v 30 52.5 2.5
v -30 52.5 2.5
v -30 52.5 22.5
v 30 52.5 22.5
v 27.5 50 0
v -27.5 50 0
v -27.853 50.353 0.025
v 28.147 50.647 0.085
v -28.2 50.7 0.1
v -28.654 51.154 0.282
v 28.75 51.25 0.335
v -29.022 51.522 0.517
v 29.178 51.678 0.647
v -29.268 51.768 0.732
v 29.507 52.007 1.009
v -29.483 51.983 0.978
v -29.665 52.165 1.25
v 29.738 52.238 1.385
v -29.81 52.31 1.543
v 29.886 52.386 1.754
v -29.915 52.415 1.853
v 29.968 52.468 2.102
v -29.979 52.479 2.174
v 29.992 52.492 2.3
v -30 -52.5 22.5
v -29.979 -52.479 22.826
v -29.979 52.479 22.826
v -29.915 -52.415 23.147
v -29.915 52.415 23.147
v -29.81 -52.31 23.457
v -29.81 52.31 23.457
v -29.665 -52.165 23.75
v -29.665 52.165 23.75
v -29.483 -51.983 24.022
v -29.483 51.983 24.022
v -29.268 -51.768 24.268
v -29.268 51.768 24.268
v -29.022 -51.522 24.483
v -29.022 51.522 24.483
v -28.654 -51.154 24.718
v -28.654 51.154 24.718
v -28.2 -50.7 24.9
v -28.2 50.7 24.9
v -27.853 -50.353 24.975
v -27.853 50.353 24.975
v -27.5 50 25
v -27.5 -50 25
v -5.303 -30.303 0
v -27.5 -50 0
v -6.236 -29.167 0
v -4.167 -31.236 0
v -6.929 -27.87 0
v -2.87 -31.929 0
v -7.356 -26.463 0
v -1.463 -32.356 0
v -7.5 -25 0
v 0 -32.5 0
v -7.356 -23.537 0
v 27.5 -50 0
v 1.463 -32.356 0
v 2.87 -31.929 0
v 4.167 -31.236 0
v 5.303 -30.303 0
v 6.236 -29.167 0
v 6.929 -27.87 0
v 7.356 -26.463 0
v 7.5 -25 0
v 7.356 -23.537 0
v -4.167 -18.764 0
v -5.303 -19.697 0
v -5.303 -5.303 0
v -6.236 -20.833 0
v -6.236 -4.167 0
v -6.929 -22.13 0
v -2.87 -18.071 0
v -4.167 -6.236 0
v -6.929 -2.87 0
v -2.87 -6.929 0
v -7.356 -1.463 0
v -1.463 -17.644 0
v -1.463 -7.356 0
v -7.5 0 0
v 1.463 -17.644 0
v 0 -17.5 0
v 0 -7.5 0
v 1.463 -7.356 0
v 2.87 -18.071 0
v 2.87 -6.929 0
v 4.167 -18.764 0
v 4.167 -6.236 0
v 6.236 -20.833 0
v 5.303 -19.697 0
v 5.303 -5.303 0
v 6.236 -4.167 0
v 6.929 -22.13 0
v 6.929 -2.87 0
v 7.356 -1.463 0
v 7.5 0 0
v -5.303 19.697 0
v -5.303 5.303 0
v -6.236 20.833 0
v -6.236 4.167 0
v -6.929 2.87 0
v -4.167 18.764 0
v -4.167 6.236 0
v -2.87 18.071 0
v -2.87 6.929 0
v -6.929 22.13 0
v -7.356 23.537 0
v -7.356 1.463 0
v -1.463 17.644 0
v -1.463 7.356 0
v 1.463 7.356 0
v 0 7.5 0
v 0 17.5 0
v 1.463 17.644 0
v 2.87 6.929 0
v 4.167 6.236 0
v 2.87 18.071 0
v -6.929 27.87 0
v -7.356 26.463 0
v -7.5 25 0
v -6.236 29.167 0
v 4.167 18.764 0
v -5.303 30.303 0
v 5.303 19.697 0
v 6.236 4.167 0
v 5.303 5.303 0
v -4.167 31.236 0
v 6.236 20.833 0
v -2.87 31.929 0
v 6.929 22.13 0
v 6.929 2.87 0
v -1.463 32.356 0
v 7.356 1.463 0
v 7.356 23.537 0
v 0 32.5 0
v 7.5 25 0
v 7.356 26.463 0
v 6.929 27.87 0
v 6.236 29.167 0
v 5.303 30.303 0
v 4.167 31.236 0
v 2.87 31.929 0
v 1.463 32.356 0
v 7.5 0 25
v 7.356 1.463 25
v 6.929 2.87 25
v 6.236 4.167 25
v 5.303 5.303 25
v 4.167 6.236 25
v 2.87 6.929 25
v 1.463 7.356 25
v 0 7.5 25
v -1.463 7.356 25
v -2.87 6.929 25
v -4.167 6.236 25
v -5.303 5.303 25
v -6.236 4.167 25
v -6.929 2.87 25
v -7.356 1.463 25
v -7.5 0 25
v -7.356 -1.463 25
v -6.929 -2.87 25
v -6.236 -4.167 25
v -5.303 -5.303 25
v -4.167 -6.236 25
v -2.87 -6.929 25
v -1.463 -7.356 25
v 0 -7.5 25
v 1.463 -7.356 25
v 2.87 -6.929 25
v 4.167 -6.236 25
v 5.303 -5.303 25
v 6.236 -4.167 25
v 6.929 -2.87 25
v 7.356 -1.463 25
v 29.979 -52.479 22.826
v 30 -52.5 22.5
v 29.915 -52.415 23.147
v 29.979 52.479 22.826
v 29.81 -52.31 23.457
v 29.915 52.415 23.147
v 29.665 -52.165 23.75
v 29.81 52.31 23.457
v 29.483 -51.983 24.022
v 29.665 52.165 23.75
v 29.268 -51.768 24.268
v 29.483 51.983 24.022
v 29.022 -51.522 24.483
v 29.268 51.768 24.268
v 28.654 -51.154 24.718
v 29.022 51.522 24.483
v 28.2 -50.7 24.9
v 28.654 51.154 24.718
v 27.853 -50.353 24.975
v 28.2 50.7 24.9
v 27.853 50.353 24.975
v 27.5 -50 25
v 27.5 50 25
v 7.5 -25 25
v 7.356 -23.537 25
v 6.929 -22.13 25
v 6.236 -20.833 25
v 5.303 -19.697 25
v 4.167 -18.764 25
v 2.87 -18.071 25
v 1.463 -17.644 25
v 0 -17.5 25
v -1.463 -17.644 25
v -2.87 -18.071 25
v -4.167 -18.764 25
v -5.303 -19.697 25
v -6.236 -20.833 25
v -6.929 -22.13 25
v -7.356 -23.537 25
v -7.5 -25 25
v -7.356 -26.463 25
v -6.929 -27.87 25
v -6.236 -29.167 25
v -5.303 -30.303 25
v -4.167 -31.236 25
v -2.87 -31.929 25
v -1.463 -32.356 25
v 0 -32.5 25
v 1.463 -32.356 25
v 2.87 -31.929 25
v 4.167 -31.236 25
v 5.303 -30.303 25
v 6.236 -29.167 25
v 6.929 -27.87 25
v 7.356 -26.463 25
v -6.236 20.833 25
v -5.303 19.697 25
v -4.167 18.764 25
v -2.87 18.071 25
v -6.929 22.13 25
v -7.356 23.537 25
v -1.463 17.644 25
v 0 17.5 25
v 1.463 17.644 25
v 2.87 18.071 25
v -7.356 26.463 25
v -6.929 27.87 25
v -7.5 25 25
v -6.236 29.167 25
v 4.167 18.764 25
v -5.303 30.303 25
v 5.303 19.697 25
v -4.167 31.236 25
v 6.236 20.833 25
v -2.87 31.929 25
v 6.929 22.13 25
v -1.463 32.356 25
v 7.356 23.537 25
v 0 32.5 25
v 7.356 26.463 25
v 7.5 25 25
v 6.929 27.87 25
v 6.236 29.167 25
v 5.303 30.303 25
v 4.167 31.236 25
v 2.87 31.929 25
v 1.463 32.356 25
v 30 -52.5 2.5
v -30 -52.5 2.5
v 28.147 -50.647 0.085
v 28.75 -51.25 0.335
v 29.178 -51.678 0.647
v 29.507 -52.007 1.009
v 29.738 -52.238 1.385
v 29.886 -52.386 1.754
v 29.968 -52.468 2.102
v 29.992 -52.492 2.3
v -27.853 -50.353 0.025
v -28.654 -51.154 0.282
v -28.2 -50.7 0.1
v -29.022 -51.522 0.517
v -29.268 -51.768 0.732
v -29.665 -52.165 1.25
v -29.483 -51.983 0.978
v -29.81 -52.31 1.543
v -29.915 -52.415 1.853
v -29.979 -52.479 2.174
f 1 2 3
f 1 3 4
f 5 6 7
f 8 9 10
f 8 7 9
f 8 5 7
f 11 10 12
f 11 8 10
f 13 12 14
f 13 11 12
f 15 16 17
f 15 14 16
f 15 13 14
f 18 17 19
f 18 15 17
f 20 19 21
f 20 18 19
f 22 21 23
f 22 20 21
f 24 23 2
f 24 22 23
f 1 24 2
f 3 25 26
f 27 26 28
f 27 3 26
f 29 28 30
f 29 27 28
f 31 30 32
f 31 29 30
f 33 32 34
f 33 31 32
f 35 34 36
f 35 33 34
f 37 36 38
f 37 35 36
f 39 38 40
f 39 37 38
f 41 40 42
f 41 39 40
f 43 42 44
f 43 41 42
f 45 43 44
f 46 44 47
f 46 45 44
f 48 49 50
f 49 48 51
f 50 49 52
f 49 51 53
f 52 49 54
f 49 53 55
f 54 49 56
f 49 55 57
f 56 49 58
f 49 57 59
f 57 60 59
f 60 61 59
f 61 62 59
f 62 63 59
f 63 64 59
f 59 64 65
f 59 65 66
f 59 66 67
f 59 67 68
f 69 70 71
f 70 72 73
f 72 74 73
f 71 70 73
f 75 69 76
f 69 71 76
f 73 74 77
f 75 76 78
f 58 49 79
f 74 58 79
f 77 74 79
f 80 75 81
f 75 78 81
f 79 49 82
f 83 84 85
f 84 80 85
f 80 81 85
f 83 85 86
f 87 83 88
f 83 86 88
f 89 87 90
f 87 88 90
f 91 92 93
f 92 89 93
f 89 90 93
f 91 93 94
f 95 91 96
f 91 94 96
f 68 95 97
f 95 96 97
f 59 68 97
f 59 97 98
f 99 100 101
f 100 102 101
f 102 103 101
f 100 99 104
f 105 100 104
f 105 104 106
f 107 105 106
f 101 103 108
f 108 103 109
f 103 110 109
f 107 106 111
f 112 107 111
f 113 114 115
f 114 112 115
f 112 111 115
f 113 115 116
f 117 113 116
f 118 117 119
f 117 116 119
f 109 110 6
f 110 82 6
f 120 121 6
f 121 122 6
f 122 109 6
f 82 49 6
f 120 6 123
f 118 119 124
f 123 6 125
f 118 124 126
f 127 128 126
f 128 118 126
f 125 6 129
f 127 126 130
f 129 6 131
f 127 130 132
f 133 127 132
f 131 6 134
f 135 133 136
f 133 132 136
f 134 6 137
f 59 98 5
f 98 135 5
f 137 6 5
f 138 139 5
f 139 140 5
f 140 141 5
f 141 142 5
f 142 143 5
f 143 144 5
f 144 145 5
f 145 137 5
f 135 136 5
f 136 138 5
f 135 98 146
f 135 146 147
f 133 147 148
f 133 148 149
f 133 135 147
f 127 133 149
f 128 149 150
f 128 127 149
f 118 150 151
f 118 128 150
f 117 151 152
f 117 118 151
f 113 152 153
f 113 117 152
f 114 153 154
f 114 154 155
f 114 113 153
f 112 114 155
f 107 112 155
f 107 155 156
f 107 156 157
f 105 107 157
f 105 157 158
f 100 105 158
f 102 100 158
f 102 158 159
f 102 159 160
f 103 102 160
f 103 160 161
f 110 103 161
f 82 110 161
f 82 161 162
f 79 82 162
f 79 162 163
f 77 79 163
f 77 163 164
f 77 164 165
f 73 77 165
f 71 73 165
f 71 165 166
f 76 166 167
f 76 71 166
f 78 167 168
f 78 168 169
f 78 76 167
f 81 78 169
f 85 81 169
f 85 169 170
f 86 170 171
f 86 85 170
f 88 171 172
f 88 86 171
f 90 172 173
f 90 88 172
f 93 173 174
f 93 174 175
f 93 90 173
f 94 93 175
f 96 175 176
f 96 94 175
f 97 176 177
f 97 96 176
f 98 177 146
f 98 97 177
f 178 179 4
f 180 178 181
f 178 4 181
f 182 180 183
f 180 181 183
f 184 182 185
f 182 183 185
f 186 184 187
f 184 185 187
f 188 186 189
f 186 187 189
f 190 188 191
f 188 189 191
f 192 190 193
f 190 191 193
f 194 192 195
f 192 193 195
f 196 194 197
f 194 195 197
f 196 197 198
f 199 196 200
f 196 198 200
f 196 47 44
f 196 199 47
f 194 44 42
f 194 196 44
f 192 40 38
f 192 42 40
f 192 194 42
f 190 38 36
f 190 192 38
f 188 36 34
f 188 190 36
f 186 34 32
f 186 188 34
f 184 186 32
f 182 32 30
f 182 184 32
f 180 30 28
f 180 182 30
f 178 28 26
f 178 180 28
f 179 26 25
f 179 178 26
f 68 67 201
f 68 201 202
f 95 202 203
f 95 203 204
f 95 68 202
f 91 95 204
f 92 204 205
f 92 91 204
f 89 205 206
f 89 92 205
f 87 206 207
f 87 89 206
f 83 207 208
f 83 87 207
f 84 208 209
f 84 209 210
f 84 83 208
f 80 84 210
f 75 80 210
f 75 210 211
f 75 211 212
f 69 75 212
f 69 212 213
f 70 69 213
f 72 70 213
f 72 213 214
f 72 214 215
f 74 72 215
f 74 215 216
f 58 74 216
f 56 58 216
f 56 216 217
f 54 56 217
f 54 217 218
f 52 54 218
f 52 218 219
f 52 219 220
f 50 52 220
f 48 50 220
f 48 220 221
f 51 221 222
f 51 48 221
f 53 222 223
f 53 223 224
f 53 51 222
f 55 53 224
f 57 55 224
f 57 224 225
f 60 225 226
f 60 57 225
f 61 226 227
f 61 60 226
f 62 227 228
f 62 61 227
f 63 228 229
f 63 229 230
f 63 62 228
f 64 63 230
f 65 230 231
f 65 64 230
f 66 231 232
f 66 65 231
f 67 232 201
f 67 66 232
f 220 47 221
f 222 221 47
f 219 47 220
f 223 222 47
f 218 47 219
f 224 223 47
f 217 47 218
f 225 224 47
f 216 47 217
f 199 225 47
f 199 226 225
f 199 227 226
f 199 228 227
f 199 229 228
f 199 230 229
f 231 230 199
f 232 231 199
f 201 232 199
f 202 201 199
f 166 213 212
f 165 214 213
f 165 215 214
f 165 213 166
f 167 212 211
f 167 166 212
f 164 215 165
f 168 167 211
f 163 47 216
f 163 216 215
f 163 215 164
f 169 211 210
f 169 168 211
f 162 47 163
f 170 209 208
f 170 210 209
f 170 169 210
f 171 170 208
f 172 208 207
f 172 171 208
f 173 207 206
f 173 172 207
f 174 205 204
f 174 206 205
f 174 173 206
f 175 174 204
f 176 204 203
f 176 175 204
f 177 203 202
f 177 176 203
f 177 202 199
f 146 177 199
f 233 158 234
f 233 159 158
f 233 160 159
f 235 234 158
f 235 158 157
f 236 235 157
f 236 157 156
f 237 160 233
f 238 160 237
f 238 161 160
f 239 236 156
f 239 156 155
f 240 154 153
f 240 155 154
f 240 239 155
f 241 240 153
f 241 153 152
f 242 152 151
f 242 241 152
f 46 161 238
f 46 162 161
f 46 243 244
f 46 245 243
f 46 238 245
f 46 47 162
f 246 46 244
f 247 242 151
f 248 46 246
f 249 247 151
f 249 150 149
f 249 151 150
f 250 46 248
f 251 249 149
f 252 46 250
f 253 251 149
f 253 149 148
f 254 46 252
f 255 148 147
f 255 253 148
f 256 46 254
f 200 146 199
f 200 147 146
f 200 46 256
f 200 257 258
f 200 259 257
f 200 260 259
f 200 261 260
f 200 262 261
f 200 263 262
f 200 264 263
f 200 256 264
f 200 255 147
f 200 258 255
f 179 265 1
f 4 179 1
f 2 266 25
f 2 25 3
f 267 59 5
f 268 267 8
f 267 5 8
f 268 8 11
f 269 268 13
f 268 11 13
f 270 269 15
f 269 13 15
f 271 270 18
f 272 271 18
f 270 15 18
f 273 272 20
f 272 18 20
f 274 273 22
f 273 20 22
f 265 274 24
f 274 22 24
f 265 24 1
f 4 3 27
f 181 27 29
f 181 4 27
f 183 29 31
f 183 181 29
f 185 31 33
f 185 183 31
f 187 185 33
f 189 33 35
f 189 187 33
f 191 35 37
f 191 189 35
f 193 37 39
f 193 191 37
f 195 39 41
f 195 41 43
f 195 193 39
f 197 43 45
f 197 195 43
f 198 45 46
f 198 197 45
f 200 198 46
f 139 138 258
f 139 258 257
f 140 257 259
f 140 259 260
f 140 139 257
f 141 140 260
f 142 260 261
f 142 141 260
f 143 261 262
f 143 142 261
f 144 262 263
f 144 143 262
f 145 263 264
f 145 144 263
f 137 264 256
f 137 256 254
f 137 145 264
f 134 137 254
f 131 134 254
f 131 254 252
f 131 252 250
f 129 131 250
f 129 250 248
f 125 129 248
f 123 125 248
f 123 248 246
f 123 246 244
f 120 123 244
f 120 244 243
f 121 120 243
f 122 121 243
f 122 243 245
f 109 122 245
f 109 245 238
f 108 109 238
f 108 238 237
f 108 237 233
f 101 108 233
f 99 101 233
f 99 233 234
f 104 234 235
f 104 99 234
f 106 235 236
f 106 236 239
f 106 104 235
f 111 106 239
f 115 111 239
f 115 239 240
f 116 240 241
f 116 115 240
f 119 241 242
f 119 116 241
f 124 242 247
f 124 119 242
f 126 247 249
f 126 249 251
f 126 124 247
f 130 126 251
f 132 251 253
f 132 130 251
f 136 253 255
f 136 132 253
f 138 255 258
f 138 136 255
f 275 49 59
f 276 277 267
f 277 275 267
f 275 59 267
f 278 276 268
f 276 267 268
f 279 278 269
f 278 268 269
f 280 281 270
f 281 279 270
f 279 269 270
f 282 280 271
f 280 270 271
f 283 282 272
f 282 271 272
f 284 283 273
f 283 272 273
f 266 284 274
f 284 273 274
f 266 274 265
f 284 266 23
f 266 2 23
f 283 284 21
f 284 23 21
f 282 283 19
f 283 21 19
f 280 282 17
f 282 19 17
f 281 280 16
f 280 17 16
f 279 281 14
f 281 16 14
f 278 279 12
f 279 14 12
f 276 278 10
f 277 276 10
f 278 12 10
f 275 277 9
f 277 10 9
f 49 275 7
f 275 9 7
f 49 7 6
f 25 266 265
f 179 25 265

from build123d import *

# Parameters (mm, degrees)
F0_W     = 60
F0_H     = 105
F0_R     = 7.5
F1_DEPTH = 20
F2_DEPTH = 25
F3_R     = 2.5


with BuildPart() as f1:
    # F0 (on Top) → F1 (new body)
    with BuildSketch(Plane.XY):
        Rectangle(F0_W, F0_H)
        with Locations((0, -25)):
            Circle(F0_R, mode=Mode.SUBTRACT)
        Circle(F0_R, mode=Mode.SUBTRACT)
        with Locations((0, 25)):
            Circle(F0_R, mode=Mode.SUBTRACT)
    extrude(amount=F1_DEPTH)

    # F0 (on Top) → F2 (join)
    with BuildSketch(Plane.XY):
        Rectangle(F0_W, F0_H)
        with Locations((0, -25)):
            Circle(F0_R, mode=Mode.SUBTRACT)
        Circle(F0_R, mode=Mode.SUBTRACT)
        with Locations((0, 25)):
            Circle(F0_R, mode=Mode.SUBTRACT)
    extrude(amount=F2_DEPTH)

    # F3
    f3_edges = [f1.edges().sort_by_distance(p)[0] for p in [
        (-30, 0, 25),
        (0, 52.5, 25),
        (30, 0, 25),
        (0, -52.5, 25),
        (-30, 0, 0),
        (0, 52.5, 0),
        (30, 0, 0),
        (0, -52.5, 0),
    ]]
    fillet(f3_edges, radius=F3_R)


solid = f1.part
